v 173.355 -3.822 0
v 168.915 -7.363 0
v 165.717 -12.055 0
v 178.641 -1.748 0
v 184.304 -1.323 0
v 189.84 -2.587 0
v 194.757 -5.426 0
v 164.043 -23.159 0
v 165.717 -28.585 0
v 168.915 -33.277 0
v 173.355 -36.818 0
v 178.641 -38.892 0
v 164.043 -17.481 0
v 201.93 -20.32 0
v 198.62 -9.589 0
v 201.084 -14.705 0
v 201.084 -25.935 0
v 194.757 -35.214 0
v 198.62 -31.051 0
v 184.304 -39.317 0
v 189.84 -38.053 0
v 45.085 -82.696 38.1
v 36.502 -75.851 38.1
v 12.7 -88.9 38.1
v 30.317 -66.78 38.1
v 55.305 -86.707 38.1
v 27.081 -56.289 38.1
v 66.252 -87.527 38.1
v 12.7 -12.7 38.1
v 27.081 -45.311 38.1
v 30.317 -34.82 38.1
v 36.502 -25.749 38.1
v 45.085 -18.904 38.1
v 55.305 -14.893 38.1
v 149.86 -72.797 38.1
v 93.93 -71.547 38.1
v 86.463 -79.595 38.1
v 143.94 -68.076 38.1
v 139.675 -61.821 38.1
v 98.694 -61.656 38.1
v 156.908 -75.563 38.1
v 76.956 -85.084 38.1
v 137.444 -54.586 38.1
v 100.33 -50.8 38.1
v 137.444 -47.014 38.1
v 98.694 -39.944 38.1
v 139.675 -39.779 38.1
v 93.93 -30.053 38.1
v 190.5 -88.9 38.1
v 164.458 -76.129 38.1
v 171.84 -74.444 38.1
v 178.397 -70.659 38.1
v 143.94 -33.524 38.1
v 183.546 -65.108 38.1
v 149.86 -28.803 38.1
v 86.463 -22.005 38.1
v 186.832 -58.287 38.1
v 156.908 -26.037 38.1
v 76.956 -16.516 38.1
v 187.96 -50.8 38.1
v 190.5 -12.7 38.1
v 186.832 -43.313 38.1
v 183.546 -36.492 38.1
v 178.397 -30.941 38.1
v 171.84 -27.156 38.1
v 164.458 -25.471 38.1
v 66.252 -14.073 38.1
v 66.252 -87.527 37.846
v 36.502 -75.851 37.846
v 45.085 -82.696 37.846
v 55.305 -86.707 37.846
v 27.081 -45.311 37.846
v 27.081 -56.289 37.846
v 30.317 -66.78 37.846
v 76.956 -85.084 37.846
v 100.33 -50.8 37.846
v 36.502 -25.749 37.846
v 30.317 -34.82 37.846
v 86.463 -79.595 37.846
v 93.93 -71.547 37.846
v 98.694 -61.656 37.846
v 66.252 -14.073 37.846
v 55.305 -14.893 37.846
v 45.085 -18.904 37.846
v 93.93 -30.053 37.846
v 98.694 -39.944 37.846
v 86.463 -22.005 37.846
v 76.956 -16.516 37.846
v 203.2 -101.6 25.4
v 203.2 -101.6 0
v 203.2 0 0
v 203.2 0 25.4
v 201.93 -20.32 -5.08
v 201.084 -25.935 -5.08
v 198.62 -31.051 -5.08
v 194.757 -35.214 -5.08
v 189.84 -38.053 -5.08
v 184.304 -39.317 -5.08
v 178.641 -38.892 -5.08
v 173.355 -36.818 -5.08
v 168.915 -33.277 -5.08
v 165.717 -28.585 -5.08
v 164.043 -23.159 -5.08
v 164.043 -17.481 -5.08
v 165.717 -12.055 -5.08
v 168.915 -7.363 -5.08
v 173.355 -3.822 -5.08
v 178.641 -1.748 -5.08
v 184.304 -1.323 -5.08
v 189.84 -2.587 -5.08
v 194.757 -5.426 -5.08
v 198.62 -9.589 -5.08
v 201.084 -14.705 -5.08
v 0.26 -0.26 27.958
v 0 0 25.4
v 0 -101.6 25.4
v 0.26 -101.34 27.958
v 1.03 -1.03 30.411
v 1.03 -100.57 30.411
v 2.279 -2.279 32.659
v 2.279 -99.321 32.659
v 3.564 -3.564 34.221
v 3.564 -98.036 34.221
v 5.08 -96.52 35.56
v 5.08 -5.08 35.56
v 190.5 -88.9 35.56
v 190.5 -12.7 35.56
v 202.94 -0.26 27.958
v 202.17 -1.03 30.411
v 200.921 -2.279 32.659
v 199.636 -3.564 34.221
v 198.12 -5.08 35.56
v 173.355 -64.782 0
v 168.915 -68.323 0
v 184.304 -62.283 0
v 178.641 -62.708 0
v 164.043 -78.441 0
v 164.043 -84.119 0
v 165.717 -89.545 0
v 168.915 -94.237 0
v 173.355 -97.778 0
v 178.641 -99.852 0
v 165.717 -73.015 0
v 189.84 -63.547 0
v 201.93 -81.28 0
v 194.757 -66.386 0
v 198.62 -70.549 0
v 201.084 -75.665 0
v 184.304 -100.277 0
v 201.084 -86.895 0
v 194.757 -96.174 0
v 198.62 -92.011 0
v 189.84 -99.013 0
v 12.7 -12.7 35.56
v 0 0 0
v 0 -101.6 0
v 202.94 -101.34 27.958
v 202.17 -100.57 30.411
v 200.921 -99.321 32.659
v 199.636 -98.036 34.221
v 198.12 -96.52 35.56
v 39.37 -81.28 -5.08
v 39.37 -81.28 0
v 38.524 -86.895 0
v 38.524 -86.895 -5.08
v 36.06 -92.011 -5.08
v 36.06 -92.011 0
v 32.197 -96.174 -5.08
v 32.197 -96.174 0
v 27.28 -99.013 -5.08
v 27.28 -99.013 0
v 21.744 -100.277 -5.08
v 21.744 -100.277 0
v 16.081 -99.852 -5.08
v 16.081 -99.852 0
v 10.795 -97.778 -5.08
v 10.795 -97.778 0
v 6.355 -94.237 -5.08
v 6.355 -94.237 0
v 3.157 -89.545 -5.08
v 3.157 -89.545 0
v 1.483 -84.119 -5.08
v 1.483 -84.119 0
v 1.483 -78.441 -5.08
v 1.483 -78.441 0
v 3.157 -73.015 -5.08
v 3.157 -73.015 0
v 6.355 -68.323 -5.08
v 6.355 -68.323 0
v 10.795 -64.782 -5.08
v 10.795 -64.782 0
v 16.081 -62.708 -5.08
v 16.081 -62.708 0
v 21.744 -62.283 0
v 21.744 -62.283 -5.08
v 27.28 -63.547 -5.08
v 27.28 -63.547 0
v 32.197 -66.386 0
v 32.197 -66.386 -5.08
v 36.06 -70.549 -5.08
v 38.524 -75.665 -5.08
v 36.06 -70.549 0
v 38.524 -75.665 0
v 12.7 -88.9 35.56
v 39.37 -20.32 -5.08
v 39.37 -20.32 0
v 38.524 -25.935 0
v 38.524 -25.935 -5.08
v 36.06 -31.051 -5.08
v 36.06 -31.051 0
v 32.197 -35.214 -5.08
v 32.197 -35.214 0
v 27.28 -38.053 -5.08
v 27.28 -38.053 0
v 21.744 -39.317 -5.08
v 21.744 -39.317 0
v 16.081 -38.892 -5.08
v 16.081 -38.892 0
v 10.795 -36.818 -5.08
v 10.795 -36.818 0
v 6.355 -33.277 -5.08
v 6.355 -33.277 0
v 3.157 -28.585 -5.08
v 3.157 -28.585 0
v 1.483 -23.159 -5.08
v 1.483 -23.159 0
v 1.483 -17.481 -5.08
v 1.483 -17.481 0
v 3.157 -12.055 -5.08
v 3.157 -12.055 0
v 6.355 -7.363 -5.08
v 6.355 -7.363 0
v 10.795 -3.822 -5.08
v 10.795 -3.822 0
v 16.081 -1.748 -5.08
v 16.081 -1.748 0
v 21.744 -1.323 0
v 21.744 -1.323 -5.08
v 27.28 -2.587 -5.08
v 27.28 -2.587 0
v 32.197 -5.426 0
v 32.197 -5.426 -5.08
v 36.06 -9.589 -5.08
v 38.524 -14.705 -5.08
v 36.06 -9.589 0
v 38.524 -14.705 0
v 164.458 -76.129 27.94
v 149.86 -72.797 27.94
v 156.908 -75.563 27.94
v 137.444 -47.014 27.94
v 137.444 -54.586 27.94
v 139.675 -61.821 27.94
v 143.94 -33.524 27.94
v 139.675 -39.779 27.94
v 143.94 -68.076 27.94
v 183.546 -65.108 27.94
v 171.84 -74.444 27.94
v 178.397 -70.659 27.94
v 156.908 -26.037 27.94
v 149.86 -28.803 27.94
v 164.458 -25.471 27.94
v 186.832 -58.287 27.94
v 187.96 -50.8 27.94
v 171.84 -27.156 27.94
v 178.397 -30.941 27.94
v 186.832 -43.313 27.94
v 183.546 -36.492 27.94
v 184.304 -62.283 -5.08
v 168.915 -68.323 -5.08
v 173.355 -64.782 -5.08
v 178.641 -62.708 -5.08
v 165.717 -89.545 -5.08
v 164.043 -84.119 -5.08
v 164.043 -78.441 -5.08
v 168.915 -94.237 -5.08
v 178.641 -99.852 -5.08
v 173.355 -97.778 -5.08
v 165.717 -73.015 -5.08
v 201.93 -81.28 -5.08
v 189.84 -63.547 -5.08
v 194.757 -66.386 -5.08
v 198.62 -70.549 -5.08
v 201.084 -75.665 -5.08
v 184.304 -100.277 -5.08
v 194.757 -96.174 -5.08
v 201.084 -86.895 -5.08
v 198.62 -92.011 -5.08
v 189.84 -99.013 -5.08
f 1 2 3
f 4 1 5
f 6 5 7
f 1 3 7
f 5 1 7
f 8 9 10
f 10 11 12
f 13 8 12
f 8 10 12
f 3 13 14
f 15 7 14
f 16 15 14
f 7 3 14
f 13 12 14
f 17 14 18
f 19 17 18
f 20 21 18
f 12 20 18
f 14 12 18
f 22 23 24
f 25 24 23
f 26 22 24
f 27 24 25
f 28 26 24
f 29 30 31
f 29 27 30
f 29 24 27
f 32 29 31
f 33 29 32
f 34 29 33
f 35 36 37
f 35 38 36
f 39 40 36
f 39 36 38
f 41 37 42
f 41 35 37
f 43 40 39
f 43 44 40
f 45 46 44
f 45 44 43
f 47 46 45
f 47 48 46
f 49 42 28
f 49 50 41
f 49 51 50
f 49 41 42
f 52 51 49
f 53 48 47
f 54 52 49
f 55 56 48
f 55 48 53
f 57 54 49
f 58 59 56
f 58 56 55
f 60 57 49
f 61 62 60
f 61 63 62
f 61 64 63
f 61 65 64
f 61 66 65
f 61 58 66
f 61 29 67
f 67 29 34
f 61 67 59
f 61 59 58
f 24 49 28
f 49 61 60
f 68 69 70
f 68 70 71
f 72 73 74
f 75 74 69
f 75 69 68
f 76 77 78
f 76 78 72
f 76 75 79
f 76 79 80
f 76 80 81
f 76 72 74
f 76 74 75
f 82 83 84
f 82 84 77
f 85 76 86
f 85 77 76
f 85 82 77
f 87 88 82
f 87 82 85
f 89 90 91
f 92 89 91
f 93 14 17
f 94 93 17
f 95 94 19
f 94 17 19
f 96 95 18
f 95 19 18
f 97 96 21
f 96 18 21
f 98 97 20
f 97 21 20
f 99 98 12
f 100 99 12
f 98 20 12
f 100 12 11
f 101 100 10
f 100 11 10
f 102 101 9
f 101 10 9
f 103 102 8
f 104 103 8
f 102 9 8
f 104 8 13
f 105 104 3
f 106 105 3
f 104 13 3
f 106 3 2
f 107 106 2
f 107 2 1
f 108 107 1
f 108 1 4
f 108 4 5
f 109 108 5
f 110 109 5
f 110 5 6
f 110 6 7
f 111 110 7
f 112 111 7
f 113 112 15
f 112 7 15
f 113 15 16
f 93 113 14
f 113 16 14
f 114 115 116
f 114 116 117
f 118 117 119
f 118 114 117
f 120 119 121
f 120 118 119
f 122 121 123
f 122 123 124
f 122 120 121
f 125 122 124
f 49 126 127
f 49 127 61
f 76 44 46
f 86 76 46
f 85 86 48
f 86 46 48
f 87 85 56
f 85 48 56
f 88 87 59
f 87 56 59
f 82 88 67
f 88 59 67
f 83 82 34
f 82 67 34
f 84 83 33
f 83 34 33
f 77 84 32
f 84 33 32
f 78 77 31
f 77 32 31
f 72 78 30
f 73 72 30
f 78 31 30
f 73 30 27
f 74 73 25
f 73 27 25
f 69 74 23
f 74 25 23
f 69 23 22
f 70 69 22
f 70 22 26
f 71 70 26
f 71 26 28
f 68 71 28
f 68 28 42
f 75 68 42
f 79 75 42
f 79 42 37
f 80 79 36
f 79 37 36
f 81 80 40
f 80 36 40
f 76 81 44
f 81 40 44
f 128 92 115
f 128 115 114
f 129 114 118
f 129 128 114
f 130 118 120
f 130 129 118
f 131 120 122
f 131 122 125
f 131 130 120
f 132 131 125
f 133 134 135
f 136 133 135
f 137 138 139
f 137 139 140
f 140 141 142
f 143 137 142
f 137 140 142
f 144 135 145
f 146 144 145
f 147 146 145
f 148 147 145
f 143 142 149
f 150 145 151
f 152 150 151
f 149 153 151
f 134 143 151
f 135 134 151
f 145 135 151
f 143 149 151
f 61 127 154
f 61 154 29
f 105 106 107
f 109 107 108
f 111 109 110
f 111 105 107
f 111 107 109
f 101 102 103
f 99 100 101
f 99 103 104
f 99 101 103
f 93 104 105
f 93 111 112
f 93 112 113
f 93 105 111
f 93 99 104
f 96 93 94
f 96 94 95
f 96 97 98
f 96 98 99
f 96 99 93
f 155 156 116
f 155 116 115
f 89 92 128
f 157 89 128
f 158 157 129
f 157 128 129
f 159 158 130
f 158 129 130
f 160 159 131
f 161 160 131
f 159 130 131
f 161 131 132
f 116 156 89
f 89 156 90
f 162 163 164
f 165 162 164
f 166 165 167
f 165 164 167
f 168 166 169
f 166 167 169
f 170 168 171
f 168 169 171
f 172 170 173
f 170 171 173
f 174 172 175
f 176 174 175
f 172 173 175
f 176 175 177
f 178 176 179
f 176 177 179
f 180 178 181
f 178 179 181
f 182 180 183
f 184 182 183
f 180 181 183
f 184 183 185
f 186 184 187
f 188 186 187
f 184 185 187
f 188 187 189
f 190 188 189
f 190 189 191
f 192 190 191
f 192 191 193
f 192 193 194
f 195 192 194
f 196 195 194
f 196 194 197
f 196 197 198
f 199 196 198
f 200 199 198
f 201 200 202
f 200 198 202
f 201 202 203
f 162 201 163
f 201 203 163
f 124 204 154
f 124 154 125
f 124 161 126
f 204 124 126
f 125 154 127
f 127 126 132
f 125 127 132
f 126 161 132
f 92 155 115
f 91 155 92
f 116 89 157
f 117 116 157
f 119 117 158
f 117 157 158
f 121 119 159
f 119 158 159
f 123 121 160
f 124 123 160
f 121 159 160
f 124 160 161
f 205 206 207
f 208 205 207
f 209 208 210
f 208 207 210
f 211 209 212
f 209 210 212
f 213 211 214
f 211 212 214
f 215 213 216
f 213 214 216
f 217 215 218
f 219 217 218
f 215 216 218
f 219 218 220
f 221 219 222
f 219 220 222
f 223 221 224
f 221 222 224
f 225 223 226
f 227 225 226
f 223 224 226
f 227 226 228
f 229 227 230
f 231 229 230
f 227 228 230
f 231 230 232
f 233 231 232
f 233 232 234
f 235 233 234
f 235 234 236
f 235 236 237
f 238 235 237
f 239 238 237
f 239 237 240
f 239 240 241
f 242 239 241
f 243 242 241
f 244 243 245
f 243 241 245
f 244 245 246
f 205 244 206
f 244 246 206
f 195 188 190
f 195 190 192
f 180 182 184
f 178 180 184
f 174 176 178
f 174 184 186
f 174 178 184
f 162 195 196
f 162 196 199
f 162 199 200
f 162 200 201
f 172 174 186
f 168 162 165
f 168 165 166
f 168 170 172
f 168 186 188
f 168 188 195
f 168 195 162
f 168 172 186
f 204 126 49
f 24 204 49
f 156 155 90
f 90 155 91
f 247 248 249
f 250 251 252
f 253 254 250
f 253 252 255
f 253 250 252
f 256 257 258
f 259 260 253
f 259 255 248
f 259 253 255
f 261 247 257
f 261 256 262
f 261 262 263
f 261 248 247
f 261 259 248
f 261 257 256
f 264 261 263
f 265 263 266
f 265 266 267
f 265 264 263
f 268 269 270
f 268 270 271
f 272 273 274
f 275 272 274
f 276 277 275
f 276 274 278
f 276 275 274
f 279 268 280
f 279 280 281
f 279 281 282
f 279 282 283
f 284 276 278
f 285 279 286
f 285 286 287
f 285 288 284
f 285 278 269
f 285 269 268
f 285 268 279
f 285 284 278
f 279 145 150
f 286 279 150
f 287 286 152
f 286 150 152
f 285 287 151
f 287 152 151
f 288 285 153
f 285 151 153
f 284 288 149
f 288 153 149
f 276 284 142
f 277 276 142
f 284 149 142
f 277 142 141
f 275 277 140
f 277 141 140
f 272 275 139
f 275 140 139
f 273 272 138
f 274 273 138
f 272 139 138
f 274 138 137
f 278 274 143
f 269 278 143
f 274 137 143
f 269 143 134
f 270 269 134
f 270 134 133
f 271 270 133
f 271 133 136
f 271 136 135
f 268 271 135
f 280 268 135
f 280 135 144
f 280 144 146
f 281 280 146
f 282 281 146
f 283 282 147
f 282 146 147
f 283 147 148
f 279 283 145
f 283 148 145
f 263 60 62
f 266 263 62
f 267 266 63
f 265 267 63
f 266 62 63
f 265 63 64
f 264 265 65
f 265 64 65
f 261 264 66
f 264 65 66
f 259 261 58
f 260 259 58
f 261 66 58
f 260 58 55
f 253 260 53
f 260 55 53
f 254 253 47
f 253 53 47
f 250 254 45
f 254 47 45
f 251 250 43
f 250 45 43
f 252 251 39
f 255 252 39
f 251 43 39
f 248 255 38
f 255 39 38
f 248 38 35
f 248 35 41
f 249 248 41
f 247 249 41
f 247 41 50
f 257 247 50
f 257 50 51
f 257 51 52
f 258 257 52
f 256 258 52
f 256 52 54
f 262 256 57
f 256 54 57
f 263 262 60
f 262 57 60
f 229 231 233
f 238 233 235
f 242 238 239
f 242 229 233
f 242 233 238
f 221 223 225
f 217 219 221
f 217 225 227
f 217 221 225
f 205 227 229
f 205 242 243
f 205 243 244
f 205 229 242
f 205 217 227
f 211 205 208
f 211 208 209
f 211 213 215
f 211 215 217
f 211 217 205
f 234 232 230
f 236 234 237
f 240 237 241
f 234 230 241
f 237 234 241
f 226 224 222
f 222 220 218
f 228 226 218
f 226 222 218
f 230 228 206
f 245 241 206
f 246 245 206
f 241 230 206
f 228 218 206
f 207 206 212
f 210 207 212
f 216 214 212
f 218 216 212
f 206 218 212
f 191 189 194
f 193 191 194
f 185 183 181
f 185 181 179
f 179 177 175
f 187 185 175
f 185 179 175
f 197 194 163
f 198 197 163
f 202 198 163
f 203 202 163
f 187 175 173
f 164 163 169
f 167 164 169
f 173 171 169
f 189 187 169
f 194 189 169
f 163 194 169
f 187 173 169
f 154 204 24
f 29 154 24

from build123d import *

# Parameters (mm, degrees)
F0_W      = 203.2
F0_H      = 101.6
F1_DEPTH  = 38.1
F2_R      = 19.05
F3_DEPTH  = 5.08
F4_R      = 12.7
F5_W      = 12.7
F5_H      = 2.54
F6_DEPTH  = 203.201
F7_W      = 12.7
F7_H      = 2.54
F8_DEPTH  = 101.601
F9_R      = 25.4
F10_DEPTH = 10.16
F11_R     = 36.83
F12_DEPTH = 0.254


with BuildPart() as f1:
    # F0 (on Top) → F1 (new body)
    with BuildSketch(Plane.XY):
        with Locations((101.6, -50.8)):
            Rectangle(F0_W, F0_H)
    extrude(amount=F1_DEPTH)

    # F4
    f4_edges = [f1.edges().sort_by_distance(p)[0] for p in [
        (101.6, 0, 38.1),
        (0, -50.8, 38.1),
        (101.6, -101.6, 38.1),
        (203.2, -50.8, 38.1),
    ]]
    fillet(f4_edges, radius=F4_R)

    # F5 (on face) → F6 (cut, through all)
    with BuildSketch(Plane.YZ.offset(203.2)):
        with Locations((-6.35, 36.83)):
            Rectangle(F5_W, F5_H)
        with Locations((-95.25, 36.83)):
            Rectangle(F5_W, F5_H)
    extrude(amount=-F6_DEPTH, mode=Mode.SUBTRACT)

    # F7 (on face) → F8 (cut, through all)
    with BuildSketch(Plane.XZ.offset(101.6)):
        with Locations((196.85, 36.83)):
            Rectangle(F7_W, F7_H)
        with Locations((6.35, 36.83)):
            Rectangle(F7_W, F7_H)
    extrude(amount=-F8_DEPTH, mode=Mode.SUBTRACT)

    # F9 (on face) → F10 (cut)
    with BuildSketch(Plane.XY.offset(38.1)):
        with Locations((162.56, -50.8)):
            Circle(F9_R)
    extrude(amount=-F10_DEPTH, mode=Mode.SUBTRACT)

    # F11 (on face) → F12 (cut)
    with BuildSketch(Plane.XY.offset(38.1)):
        with Locations((63.5, -50.8)):
            Circle(F11_R)
    extrude(amount=-F12_DEPTH, mode=Mode.SUBTRACT)


with BuildPart() as f3:
    # F2 (on face) → F3 (new body)
    with BuildSketch(Plane(origin=(0, 0, 0), x_dir=(1, 0, 0), z_dir=(0, 0, -1))):
        with Locations((20.32, 81.28)):
            Circle(F2_R)
        with Locations((20.32, 20.32)):
            Circle(F2_R)
        with Locations((182.88, 81.28)):
            Circle(F2_R)
        with Locations((182.88, 20.32)):
            Circle(F2_R)
    extrude(amount=F3_DEPTH)


solid = Compound([f1.part, f3.part])
